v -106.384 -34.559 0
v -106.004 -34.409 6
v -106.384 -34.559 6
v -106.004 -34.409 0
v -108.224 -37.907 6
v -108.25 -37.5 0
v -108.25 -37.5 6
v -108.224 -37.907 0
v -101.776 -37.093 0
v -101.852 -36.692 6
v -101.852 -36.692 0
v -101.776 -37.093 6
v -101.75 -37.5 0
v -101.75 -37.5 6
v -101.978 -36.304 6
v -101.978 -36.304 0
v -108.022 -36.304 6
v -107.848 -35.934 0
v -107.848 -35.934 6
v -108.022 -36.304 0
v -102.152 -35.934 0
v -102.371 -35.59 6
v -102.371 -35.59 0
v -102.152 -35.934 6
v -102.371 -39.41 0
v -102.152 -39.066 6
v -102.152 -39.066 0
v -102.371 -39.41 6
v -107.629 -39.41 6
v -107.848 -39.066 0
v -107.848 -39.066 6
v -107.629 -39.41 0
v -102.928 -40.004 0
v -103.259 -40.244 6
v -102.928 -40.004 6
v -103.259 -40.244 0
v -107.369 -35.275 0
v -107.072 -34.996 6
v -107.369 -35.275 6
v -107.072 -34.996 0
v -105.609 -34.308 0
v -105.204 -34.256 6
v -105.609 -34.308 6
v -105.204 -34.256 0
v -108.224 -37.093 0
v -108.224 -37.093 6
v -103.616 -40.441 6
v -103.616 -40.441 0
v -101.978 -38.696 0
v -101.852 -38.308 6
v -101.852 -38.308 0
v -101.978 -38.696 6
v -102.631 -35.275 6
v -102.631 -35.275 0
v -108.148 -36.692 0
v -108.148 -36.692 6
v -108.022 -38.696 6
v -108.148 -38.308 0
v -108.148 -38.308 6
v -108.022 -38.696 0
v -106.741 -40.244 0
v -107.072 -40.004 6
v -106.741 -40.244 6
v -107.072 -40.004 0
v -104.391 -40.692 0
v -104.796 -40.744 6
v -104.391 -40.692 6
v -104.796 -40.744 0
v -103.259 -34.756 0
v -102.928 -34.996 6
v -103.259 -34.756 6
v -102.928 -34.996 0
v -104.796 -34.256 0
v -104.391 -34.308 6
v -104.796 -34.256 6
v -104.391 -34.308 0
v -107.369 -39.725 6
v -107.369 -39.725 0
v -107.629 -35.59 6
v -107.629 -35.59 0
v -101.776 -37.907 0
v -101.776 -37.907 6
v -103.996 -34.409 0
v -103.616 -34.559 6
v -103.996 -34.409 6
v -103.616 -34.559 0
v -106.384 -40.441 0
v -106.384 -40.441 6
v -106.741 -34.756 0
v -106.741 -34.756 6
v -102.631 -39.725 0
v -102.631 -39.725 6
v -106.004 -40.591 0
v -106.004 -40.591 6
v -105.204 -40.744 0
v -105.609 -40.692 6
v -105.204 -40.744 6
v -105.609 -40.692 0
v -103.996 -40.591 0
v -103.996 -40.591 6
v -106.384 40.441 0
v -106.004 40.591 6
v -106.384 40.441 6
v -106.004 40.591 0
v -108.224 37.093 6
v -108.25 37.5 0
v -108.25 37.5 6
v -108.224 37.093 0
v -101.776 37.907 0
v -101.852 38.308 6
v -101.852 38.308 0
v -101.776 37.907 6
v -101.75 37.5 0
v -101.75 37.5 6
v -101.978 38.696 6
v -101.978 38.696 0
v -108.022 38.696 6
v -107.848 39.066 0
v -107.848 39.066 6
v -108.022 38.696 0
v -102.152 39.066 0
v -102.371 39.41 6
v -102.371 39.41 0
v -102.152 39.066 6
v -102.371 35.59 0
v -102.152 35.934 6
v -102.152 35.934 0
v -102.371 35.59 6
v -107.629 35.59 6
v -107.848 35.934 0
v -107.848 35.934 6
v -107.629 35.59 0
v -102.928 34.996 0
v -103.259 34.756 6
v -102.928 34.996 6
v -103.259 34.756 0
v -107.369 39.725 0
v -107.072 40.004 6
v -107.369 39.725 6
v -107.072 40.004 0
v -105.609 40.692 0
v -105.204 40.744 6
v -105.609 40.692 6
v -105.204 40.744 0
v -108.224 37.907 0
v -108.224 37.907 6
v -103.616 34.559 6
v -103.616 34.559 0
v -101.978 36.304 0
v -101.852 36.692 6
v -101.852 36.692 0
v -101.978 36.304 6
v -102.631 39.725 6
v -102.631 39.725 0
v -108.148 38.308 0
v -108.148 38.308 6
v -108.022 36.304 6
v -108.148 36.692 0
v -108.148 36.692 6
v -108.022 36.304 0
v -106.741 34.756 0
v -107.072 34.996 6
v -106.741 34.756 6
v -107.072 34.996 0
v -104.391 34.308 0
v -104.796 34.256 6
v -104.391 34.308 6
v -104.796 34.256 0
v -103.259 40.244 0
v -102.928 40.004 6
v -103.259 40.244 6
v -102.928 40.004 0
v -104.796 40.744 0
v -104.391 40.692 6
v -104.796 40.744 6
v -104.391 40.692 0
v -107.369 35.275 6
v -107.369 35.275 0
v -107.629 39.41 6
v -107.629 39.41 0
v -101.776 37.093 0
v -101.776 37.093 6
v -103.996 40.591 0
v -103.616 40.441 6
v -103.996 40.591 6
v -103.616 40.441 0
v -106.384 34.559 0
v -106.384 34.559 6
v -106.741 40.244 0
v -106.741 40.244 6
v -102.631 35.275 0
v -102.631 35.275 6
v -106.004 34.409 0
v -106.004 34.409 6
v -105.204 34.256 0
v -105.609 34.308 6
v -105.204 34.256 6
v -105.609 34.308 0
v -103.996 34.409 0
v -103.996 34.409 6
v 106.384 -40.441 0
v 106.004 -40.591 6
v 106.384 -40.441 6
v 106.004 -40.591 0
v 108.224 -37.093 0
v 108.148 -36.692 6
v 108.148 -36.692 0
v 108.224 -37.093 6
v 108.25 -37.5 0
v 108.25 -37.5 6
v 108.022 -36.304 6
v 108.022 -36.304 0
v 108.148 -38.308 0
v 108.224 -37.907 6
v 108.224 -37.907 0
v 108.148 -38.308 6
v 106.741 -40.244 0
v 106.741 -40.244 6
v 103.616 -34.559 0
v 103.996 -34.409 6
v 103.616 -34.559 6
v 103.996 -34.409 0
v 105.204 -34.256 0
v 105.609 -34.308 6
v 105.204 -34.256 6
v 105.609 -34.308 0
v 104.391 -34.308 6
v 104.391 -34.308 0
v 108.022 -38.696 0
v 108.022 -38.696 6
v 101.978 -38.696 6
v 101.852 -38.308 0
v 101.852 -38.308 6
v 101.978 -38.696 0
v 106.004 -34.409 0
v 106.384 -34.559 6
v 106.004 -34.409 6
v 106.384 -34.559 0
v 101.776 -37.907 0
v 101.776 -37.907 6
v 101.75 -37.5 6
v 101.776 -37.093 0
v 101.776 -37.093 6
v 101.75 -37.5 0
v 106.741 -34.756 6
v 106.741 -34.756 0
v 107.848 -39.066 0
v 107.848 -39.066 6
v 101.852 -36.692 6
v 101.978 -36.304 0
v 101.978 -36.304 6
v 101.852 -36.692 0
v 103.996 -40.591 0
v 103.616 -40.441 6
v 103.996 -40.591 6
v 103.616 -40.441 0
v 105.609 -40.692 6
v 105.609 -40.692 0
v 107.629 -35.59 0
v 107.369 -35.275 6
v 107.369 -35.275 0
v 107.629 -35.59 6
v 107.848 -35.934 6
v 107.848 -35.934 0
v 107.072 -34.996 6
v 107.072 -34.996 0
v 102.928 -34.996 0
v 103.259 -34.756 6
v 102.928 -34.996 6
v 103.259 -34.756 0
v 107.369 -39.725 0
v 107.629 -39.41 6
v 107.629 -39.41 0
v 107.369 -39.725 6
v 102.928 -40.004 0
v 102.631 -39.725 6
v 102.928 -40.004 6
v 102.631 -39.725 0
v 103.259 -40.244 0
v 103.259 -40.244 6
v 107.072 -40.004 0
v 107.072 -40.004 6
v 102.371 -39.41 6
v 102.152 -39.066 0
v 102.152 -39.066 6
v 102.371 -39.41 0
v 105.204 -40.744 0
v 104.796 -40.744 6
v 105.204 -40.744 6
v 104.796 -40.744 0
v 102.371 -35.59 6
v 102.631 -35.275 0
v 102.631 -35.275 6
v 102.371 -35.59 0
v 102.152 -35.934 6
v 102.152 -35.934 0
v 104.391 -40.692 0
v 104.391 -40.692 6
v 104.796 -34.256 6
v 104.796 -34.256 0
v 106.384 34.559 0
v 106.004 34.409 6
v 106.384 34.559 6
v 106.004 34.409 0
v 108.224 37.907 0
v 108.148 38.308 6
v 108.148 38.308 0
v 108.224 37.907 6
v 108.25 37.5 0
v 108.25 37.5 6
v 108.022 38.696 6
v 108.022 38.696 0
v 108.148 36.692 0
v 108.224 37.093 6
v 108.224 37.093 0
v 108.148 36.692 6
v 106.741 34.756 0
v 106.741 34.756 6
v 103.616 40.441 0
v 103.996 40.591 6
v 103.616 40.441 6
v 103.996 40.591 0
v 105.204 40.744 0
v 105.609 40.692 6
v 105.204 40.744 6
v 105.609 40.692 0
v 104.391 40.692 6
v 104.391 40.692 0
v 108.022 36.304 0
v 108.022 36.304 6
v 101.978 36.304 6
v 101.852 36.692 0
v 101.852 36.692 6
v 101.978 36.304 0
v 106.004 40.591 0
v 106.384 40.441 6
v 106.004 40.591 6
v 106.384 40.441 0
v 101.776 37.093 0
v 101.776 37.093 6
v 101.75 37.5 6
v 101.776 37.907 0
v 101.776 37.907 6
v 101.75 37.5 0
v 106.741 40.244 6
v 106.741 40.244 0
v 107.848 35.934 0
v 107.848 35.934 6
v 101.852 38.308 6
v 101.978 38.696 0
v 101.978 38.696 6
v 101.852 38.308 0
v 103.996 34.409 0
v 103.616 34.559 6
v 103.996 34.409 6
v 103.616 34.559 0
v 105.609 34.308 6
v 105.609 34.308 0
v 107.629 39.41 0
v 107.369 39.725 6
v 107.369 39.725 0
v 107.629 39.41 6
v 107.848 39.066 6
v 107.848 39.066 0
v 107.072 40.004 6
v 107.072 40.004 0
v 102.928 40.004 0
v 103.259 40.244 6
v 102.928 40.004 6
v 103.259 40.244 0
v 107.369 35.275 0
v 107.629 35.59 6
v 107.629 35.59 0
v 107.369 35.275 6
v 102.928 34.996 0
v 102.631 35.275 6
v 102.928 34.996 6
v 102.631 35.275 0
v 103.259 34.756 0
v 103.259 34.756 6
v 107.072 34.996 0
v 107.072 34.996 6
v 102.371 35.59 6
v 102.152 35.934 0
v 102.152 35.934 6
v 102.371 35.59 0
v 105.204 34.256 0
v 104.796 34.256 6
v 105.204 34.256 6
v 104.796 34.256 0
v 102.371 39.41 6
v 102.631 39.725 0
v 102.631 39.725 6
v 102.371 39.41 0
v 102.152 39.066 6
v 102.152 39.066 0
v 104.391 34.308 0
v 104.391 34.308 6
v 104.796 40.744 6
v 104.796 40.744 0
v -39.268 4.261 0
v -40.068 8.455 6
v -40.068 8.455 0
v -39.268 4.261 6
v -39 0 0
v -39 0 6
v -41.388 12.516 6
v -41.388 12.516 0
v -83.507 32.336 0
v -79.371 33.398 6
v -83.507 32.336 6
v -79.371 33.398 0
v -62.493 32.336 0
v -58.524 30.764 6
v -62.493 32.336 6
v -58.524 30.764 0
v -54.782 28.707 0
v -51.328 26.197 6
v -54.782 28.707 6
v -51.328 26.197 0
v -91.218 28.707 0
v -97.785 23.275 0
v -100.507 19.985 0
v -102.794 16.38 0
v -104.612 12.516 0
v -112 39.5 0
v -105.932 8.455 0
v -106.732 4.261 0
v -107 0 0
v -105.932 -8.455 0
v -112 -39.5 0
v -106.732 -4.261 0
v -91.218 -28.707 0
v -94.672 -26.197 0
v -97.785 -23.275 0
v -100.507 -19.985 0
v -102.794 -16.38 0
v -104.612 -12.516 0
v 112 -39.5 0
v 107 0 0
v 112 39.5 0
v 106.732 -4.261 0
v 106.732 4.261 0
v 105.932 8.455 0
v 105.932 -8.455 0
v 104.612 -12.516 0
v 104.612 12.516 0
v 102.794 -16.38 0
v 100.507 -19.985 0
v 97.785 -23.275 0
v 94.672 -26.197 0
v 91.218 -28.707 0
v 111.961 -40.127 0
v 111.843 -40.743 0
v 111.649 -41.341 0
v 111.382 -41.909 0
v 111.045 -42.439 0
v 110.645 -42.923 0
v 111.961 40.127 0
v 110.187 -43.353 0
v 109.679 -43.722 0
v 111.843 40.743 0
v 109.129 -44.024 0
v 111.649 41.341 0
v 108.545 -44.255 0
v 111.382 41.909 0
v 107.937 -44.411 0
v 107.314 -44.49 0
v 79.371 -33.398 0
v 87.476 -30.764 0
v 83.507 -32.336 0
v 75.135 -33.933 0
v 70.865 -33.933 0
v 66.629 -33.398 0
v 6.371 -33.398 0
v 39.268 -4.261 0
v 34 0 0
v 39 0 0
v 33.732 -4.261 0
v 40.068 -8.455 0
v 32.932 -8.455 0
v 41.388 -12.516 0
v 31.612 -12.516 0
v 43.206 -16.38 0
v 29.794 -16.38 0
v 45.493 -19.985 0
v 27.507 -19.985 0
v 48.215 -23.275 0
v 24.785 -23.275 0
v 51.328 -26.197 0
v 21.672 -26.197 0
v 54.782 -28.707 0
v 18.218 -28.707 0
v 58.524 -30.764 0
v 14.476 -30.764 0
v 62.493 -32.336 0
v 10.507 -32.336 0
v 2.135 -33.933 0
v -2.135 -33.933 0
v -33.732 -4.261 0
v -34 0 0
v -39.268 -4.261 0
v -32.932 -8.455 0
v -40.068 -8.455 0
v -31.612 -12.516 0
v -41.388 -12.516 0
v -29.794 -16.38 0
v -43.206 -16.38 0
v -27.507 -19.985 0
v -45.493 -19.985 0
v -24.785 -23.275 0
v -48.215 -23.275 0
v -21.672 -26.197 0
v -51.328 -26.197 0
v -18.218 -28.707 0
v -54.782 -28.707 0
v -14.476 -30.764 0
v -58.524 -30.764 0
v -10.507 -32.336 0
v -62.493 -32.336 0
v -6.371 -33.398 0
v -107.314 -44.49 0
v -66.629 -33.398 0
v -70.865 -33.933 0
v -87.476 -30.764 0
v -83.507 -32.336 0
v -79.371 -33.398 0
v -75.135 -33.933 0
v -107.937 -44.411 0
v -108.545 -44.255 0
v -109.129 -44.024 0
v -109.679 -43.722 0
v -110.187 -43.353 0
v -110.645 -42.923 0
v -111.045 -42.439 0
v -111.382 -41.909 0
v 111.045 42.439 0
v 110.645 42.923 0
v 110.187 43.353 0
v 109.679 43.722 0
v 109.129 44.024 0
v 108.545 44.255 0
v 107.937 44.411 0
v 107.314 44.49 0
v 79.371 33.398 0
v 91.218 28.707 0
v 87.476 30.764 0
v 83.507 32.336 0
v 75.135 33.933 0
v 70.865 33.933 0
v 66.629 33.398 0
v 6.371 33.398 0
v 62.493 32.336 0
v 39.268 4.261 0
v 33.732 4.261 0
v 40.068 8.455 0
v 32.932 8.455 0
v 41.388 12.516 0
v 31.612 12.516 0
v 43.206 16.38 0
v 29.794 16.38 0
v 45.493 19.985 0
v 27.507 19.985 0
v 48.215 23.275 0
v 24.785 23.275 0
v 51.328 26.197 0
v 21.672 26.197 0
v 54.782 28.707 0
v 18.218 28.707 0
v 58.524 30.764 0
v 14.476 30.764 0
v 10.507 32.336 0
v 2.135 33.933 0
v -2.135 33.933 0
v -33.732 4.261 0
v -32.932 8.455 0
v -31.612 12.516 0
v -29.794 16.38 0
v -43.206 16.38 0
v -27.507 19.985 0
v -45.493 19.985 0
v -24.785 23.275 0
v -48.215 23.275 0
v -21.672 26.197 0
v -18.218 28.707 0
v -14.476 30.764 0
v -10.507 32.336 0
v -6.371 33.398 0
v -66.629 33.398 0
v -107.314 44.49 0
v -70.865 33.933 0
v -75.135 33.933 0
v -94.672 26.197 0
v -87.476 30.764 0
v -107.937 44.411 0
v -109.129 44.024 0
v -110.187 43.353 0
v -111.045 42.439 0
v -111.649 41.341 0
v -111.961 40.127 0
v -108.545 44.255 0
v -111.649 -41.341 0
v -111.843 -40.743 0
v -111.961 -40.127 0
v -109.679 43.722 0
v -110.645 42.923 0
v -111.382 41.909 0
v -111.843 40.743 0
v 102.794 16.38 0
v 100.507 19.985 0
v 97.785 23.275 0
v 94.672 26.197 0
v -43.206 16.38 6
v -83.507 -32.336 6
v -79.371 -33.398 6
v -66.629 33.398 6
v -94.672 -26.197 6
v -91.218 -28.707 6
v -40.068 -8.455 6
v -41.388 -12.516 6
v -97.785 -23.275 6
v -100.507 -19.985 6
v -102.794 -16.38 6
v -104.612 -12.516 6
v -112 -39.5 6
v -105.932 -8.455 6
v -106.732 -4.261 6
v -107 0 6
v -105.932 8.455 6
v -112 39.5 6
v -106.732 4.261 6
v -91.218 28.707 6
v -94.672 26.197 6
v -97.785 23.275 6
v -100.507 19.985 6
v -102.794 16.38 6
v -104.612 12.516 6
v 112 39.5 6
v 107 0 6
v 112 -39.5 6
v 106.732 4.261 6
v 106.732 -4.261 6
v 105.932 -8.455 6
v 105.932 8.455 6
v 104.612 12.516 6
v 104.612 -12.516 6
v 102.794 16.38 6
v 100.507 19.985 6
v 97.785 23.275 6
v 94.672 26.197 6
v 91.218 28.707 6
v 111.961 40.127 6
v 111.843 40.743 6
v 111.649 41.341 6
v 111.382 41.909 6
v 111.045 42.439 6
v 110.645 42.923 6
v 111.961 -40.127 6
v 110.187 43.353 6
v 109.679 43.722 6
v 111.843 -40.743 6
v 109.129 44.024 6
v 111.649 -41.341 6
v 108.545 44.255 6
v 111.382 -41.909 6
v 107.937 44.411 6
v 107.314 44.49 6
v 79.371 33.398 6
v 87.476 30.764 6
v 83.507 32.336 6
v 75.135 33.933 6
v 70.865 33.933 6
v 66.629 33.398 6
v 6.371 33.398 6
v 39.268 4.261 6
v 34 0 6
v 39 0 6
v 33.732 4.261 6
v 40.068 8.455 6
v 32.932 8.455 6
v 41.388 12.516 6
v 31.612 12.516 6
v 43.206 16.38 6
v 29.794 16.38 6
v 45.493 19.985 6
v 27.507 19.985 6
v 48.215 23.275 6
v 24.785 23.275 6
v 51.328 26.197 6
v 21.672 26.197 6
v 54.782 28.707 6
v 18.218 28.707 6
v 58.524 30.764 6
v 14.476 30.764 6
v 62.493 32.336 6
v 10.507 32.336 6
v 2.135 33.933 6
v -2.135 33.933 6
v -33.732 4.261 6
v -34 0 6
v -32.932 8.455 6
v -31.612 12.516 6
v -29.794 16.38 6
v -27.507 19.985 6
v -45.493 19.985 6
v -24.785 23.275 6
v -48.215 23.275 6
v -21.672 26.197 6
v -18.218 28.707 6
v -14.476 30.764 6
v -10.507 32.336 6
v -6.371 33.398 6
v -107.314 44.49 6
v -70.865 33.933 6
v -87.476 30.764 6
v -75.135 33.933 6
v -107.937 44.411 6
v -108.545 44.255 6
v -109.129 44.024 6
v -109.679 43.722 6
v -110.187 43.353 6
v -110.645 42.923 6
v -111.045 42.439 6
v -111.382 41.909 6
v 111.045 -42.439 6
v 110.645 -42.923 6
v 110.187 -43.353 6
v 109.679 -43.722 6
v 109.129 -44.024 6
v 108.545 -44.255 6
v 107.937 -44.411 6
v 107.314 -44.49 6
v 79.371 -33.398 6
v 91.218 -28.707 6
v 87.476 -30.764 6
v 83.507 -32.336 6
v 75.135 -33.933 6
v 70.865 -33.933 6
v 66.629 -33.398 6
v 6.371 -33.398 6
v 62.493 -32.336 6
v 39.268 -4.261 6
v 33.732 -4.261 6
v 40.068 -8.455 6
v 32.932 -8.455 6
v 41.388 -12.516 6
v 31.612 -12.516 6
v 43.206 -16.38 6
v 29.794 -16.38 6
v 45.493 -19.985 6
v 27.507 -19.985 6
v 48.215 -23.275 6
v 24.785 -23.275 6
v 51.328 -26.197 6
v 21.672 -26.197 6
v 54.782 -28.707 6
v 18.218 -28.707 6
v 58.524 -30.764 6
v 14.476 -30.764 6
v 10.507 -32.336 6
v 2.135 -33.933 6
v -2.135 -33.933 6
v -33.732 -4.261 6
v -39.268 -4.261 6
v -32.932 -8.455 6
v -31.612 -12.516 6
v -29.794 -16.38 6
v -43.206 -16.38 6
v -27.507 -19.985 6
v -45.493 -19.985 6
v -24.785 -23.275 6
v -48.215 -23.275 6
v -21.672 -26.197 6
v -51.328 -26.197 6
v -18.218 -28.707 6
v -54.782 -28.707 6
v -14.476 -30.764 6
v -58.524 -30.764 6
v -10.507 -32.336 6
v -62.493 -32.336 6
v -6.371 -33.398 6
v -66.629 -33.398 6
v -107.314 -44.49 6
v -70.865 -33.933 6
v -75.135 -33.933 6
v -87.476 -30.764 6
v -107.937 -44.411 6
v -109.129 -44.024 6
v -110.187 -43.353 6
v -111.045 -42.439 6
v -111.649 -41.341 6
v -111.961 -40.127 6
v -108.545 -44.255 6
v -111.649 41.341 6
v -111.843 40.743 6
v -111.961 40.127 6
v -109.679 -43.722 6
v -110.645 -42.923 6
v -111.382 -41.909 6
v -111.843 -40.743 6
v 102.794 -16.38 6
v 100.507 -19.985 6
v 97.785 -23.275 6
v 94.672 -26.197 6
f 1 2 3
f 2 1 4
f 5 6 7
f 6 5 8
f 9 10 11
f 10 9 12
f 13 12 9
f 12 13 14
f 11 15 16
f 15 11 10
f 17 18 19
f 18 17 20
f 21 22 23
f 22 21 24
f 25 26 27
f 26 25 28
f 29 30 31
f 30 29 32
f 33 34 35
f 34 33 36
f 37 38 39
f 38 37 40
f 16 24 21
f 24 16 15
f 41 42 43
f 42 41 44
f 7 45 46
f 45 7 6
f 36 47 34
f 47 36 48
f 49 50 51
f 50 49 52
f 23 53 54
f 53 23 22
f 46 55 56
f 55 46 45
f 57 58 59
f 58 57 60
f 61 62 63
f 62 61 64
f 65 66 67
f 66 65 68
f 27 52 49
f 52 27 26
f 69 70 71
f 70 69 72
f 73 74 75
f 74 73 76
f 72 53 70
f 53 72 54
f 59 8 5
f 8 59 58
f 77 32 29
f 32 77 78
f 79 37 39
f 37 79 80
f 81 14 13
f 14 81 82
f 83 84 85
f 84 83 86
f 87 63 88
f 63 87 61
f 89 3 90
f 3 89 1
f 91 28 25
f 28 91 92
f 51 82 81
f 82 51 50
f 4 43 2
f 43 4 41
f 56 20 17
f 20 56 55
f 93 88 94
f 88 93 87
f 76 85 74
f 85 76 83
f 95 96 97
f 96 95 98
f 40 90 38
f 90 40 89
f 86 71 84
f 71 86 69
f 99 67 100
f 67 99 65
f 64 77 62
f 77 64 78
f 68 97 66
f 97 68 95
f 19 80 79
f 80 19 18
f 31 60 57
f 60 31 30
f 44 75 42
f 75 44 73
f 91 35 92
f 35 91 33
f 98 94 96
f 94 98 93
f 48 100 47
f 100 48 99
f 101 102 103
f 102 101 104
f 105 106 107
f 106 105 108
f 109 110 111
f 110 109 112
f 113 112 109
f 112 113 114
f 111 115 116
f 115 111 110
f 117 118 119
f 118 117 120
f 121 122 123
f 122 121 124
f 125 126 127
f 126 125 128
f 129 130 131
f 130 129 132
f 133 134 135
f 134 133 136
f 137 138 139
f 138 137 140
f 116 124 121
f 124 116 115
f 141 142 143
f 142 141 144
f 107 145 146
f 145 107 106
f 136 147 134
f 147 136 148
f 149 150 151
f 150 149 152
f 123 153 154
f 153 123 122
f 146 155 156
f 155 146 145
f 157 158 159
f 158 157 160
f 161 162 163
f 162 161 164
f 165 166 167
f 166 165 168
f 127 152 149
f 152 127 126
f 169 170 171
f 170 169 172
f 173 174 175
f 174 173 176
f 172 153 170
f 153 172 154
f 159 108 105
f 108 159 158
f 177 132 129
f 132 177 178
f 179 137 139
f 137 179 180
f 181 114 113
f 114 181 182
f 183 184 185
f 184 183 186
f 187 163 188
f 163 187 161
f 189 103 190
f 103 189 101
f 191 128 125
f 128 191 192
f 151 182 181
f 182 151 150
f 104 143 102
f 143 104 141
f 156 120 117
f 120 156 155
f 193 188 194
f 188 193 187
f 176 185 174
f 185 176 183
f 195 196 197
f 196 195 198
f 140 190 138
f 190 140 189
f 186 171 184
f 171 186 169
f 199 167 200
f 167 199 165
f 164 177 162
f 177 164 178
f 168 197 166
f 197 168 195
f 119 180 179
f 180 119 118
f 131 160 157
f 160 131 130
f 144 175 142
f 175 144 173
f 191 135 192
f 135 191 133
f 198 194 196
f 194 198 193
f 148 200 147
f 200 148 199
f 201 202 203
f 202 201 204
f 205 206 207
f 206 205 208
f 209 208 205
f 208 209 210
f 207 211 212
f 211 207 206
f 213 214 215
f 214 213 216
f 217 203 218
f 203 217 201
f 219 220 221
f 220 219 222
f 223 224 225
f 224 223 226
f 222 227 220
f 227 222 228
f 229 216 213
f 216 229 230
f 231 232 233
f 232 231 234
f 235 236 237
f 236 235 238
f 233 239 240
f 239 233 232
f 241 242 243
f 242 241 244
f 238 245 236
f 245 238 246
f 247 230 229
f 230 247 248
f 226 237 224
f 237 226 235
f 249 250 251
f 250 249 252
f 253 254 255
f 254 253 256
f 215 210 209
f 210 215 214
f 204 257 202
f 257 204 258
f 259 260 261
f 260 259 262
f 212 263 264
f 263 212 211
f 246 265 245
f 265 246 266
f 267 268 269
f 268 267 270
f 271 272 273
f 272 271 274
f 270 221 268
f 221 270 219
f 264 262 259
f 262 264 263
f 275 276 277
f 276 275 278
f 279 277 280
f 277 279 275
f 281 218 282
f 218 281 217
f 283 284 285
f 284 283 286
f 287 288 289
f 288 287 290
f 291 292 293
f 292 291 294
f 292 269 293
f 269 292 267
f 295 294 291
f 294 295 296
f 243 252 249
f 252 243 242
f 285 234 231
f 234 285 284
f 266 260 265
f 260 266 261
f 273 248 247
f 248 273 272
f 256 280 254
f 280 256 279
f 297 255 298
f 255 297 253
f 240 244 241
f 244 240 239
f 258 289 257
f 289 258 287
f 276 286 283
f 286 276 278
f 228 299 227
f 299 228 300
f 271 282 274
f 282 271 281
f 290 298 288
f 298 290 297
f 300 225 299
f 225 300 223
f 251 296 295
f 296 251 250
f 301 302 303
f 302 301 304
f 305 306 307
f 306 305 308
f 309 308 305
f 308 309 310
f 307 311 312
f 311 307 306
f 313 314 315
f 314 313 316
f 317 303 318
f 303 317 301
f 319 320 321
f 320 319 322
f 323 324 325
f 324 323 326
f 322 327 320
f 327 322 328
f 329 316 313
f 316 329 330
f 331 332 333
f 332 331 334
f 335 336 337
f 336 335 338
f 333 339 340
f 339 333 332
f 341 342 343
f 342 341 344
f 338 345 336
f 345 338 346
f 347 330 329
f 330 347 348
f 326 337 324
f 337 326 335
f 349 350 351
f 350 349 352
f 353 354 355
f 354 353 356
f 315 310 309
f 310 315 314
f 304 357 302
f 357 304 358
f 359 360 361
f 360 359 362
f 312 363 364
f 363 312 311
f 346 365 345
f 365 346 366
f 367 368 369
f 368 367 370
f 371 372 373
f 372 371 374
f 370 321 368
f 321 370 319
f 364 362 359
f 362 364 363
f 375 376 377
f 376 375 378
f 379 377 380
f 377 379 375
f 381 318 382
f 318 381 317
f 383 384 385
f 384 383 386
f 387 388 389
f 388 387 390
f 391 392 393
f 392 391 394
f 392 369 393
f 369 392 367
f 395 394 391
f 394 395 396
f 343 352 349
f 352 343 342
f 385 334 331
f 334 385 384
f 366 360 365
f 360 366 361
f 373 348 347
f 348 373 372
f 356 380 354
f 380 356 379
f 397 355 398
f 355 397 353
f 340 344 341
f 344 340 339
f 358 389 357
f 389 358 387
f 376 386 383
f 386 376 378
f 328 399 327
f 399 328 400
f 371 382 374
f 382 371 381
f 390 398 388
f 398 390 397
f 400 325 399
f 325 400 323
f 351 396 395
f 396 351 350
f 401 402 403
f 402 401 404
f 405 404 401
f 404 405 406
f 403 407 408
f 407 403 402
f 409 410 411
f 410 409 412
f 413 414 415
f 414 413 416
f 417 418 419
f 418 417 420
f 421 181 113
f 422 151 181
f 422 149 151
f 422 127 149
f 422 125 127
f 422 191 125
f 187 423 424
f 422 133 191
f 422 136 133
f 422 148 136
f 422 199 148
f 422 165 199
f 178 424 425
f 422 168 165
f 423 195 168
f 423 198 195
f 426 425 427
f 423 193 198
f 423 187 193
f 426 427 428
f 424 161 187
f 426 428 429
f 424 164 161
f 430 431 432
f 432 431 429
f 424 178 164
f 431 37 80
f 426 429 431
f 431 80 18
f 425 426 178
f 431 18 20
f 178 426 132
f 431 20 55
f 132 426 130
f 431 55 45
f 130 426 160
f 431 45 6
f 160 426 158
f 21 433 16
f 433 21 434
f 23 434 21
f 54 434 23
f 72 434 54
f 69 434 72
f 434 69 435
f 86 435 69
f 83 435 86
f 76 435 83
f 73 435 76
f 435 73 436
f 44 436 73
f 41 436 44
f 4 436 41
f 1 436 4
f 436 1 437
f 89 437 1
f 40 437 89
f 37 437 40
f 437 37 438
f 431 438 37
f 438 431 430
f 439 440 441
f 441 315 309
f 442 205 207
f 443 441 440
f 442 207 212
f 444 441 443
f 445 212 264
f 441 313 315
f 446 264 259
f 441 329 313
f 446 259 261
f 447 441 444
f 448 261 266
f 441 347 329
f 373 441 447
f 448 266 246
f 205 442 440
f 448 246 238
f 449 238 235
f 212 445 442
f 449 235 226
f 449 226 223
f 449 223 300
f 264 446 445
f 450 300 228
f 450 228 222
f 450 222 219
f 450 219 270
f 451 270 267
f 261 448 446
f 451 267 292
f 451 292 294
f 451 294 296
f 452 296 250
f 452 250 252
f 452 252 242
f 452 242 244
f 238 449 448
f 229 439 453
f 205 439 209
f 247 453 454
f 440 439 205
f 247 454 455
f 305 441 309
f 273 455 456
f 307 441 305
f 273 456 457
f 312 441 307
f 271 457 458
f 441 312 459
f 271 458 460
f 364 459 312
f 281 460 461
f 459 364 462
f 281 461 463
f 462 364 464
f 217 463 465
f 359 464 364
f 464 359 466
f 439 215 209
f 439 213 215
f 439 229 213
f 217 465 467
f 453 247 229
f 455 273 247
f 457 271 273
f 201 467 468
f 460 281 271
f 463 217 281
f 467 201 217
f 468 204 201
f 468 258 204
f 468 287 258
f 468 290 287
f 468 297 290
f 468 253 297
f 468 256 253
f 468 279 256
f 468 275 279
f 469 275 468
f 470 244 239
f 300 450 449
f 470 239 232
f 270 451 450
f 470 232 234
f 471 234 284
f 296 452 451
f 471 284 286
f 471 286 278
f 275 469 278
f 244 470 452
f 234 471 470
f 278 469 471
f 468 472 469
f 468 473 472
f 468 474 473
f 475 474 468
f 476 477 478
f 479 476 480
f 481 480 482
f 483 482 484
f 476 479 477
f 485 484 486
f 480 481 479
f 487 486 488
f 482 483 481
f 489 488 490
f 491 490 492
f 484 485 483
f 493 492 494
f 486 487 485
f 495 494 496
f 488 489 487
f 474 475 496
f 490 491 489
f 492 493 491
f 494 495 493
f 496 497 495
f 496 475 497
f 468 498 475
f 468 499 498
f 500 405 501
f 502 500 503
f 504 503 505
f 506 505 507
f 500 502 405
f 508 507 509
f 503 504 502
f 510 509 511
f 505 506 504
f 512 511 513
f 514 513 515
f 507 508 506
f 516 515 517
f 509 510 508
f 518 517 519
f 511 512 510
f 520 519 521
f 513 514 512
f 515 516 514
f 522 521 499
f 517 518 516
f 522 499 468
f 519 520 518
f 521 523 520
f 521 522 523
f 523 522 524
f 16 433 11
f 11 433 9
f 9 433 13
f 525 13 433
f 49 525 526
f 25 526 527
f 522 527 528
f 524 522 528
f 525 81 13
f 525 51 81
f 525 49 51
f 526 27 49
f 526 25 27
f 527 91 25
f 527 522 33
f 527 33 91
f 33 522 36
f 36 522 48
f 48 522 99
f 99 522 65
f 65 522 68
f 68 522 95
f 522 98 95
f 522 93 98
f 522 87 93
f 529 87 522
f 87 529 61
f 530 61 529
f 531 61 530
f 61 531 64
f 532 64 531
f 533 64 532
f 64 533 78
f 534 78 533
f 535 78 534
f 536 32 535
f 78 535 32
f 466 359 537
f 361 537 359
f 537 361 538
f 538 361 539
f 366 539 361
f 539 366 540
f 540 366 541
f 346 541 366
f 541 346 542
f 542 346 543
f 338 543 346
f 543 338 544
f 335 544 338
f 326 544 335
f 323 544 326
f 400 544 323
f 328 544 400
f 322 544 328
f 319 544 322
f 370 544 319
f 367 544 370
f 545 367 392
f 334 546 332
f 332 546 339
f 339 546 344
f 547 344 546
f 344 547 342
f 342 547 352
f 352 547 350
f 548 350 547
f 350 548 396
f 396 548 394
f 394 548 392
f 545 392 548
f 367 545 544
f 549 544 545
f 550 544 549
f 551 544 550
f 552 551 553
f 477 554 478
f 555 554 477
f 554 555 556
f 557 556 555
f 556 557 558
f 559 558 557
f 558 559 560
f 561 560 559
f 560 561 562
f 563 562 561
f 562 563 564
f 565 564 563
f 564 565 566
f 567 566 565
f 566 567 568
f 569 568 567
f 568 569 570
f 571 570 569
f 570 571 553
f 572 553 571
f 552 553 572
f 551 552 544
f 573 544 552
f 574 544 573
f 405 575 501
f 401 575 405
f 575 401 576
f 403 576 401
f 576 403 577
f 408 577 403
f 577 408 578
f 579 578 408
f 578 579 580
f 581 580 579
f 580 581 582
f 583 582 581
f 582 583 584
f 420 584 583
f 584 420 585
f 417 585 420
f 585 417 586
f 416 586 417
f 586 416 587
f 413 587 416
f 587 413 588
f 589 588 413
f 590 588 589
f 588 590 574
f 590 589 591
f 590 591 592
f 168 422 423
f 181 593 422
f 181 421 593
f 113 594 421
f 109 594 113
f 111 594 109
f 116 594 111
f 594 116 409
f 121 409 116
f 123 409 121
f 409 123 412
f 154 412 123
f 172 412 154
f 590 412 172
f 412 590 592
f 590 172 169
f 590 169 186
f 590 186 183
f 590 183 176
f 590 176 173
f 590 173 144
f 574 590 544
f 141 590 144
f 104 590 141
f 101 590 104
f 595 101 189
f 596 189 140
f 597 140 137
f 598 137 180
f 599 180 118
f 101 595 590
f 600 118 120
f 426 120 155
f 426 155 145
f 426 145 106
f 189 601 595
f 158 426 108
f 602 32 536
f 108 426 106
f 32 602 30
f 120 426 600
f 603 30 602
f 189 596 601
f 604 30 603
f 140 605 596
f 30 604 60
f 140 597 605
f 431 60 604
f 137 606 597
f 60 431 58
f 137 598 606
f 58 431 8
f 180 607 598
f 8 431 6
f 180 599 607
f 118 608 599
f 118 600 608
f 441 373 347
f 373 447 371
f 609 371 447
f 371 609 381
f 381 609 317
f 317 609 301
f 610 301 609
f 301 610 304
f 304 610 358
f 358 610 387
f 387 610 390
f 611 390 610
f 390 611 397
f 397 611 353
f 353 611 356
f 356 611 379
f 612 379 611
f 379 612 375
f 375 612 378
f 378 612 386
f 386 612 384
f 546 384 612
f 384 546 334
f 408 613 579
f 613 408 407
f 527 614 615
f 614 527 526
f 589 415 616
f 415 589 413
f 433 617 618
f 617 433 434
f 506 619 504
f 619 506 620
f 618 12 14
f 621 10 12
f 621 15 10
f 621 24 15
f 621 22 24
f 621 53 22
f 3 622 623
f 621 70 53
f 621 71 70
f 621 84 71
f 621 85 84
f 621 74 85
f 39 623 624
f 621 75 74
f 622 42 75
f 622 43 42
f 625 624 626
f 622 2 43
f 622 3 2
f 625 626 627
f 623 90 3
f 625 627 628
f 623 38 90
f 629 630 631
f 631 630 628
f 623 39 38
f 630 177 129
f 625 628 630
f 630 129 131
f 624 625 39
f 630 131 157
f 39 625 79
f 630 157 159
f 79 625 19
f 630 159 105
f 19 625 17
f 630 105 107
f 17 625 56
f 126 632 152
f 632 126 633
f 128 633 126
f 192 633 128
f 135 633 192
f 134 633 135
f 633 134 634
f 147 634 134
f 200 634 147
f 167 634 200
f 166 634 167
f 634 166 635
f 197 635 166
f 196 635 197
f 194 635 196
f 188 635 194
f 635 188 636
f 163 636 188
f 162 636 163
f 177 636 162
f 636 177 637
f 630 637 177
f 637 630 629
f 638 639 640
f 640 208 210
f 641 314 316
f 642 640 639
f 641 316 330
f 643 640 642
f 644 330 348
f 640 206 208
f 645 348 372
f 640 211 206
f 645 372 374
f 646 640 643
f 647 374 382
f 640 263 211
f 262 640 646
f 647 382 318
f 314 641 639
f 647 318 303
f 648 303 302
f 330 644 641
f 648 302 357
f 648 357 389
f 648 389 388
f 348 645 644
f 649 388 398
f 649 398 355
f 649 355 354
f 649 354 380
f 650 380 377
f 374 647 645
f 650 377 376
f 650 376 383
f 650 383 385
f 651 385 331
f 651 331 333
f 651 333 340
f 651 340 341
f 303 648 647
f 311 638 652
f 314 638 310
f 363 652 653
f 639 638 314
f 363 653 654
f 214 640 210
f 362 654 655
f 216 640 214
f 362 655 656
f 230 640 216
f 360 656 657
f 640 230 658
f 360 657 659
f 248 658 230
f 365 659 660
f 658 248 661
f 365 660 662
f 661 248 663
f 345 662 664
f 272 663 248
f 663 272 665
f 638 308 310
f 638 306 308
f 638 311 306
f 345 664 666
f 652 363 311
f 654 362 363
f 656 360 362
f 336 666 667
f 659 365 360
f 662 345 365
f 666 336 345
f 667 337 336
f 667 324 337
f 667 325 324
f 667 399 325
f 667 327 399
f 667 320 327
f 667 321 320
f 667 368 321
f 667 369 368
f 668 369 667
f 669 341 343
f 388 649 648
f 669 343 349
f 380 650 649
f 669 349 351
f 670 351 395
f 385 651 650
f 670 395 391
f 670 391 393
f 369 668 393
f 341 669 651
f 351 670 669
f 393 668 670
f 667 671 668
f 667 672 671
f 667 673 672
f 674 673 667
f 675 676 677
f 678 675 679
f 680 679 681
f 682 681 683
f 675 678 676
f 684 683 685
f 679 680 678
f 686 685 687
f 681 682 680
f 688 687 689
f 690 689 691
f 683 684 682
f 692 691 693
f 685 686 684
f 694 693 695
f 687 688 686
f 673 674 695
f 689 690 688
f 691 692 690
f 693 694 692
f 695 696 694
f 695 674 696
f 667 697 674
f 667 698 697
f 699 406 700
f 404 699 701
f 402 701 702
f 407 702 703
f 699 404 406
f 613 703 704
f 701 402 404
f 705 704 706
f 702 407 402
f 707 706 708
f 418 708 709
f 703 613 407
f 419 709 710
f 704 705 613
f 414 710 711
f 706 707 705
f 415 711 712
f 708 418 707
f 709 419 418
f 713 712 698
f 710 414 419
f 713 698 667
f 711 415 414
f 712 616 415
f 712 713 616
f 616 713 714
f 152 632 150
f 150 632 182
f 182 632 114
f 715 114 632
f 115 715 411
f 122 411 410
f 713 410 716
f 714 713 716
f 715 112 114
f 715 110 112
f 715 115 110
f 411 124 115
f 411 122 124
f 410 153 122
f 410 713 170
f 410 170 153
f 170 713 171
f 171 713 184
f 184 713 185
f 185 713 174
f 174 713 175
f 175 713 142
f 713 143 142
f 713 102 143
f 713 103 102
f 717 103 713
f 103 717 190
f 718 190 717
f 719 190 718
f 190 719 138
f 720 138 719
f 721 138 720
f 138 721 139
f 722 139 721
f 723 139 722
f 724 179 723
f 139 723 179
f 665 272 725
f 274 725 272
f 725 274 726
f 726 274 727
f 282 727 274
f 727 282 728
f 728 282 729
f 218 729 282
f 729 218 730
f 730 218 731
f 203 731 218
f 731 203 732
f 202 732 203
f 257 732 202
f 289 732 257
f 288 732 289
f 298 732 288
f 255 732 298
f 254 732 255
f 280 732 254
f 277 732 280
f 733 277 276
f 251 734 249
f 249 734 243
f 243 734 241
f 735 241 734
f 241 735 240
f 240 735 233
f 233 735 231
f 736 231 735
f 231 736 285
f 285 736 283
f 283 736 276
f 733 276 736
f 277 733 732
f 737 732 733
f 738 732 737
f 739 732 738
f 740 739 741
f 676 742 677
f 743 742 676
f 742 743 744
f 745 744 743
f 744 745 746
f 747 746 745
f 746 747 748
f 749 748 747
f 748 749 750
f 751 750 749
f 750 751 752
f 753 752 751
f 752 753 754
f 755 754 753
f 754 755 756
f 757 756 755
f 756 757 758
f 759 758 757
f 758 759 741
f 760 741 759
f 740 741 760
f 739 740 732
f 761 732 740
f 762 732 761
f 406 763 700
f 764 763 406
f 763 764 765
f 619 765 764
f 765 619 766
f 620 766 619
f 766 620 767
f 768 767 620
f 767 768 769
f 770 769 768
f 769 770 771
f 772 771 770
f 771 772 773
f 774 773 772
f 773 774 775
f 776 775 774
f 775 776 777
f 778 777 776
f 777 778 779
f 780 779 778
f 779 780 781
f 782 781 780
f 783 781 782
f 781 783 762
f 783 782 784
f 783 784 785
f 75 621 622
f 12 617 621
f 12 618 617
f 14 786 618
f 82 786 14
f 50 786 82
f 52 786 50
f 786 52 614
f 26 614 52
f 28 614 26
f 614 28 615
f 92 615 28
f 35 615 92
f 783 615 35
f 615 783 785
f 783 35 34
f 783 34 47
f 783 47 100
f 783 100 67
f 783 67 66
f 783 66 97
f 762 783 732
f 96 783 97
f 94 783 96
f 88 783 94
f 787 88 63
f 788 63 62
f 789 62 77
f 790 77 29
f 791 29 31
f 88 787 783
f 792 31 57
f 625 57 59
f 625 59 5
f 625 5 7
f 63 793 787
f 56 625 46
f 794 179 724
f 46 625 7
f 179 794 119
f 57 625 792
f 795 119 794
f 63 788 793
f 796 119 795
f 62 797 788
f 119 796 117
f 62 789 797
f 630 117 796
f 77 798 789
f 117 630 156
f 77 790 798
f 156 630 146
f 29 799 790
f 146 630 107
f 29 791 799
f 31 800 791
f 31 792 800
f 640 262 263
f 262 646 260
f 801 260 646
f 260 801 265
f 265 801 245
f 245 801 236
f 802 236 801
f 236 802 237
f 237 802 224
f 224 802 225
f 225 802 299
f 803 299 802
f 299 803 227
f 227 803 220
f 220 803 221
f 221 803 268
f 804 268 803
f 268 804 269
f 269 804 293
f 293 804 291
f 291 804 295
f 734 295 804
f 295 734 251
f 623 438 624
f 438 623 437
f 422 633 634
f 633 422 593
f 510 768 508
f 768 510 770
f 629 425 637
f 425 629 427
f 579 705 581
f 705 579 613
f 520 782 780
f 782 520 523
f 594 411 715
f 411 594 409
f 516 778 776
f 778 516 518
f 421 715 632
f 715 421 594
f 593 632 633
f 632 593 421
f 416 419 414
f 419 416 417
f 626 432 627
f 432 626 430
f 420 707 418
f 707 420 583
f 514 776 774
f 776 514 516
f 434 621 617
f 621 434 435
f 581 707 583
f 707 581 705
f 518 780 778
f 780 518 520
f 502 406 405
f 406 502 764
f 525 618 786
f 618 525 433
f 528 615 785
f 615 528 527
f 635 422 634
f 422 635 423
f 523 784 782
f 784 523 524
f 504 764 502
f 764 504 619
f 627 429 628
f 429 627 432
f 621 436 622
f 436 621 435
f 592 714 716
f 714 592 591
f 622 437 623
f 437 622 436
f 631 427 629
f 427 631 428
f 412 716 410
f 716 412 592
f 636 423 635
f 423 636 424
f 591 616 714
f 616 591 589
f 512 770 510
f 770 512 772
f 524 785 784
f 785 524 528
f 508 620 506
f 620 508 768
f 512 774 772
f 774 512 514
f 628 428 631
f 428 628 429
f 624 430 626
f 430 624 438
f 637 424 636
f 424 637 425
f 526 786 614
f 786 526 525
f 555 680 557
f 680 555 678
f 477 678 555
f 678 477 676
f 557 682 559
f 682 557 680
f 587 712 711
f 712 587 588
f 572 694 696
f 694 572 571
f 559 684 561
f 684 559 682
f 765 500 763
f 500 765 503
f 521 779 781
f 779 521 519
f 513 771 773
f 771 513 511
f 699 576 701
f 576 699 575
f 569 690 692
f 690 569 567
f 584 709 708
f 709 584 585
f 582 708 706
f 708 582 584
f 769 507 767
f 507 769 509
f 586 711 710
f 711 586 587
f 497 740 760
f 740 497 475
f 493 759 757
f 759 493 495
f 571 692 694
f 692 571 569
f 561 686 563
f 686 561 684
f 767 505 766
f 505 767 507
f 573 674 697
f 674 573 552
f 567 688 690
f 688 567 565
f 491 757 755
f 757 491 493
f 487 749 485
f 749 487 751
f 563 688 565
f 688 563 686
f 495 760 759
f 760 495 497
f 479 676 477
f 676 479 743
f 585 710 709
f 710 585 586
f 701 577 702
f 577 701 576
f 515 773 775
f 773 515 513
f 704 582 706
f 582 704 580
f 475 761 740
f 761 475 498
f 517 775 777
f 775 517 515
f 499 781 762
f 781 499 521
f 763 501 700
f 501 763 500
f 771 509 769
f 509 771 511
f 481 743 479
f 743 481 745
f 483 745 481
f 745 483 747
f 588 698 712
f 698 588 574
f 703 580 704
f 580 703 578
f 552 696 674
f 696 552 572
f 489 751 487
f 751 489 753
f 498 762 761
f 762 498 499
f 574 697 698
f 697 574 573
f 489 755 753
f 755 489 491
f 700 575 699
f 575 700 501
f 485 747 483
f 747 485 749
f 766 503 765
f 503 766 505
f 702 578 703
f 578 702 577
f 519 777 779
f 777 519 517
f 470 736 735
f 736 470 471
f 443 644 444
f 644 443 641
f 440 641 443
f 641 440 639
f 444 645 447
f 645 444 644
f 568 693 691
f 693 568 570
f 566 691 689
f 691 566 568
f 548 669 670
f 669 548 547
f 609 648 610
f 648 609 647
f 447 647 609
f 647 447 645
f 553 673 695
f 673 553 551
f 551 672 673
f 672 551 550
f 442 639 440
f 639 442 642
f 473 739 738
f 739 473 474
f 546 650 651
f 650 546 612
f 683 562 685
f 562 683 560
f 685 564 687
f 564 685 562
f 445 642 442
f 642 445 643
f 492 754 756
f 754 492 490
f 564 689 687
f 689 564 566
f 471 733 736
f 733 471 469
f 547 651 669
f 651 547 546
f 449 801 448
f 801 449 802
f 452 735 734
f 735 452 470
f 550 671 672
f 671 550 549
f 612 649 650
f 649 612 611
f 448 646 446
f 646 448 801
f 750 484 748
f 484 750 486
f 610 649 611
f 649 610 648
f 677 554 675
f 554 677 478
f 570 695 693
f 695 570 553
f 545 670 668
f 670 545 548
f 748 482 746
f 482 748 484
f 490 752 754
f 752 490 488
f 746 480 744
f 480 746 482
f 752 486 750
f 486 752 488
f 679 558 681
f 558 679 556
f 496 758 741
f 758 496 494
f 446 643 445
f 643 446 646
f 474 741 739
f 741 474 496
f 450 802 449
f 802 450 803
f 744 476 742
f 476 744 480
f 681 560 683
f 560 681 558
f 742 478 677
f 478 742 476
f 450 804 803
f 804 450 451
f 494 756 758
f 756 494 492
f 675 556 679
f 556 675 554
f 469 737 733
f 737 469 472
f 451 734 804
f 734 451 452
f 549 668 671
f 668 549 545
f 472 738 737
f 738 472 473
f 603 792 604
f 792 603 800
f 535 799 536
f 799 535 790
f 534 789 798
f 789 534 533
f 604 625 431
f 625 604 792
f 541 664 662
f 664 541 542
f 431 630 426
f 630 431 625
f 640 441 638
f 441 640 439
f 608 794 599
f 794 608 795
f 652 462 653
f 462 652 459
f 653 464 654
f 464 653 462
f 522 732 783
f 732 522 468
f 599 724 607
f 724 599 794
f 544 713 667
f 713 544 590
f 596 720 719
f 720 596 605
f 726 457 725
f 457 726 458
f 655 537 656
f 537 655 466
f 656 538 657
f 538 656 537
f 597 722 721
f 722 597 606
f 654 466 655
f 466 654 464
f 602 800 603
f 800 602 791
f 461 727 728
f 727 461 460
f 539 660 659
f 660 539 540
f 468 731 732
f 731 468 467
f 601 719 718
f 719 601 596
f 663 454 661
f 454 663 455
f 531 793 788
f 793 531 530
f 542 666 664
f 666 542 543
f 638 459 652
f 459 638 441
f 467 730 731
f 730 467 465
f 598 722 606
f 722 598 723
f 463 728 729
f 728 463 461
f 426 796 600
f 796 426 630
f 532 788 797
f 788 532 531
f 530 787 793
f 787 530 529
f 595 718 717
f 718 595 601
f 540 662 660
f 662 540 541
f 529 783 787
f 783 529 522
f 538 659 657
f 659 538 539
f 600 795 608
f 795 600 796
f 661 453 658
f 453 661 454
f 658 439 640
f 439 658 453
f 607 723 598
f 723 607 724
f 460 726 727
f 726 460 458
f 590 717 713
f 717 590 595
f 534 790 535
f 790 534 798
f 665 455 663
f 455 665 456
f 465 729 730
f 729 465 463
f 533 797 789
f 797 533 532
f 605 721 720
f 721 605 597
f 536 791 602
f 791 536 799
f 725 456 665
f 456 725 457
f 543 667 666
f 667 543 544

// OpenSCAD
$fn = 50;


difference() {
	union() {
		hull() {
			translate(v = [-107.0000000000, 39.5000000000, 0]) {
				cylinder(h = 6, r = 5);
			}
			translate(v = [107.0000000000, 39.5000000000, 0]) {
				cylinder(h = 6, r = 5);
			}
			translate(v = [-107.0000000000, -39.5000000000, 0]) {
				cylinder(h = 6, r = 5);
			}
			translate(v = [107.0000000000, -39.5000000000, 0]) {
				cylinder(h = 6, r = 5);
			}
		}
	}
	union() {
		#translate(v = [-105.0000000000, -37.5000000000, -100.0000000000]) {
			cylinder(h = 200, r = 3.2500000000);
		}
		#translate(v = [-105.0000000000, 37.5000000000, -100.0000000000]) {
			cylinder(h = 200, r = 3.2500000000);
		}
		#translate(v = [105.0000000000, -37.5000000000, -100.0000000000]) {
			cylinder(h = 200, r = 3.2500000000);
		}
		#translate(v = [105.0000000000, 37.5000000000, -100.0000000000]) {
			cylinder(h = 200, r = 3.2500000000);
		}
		#translate(v = [-73.0000000000, 0, 0]) {
			cylinder(h = 6, r = 34.0000000000);
		}
		#cylinder(h = 6, r = 34.0000000000);
		#translate(v = [73.0000000000, 0, 0]) {
			cylinder(h = 6, r = 34.0000000000);
		}
	}
}
